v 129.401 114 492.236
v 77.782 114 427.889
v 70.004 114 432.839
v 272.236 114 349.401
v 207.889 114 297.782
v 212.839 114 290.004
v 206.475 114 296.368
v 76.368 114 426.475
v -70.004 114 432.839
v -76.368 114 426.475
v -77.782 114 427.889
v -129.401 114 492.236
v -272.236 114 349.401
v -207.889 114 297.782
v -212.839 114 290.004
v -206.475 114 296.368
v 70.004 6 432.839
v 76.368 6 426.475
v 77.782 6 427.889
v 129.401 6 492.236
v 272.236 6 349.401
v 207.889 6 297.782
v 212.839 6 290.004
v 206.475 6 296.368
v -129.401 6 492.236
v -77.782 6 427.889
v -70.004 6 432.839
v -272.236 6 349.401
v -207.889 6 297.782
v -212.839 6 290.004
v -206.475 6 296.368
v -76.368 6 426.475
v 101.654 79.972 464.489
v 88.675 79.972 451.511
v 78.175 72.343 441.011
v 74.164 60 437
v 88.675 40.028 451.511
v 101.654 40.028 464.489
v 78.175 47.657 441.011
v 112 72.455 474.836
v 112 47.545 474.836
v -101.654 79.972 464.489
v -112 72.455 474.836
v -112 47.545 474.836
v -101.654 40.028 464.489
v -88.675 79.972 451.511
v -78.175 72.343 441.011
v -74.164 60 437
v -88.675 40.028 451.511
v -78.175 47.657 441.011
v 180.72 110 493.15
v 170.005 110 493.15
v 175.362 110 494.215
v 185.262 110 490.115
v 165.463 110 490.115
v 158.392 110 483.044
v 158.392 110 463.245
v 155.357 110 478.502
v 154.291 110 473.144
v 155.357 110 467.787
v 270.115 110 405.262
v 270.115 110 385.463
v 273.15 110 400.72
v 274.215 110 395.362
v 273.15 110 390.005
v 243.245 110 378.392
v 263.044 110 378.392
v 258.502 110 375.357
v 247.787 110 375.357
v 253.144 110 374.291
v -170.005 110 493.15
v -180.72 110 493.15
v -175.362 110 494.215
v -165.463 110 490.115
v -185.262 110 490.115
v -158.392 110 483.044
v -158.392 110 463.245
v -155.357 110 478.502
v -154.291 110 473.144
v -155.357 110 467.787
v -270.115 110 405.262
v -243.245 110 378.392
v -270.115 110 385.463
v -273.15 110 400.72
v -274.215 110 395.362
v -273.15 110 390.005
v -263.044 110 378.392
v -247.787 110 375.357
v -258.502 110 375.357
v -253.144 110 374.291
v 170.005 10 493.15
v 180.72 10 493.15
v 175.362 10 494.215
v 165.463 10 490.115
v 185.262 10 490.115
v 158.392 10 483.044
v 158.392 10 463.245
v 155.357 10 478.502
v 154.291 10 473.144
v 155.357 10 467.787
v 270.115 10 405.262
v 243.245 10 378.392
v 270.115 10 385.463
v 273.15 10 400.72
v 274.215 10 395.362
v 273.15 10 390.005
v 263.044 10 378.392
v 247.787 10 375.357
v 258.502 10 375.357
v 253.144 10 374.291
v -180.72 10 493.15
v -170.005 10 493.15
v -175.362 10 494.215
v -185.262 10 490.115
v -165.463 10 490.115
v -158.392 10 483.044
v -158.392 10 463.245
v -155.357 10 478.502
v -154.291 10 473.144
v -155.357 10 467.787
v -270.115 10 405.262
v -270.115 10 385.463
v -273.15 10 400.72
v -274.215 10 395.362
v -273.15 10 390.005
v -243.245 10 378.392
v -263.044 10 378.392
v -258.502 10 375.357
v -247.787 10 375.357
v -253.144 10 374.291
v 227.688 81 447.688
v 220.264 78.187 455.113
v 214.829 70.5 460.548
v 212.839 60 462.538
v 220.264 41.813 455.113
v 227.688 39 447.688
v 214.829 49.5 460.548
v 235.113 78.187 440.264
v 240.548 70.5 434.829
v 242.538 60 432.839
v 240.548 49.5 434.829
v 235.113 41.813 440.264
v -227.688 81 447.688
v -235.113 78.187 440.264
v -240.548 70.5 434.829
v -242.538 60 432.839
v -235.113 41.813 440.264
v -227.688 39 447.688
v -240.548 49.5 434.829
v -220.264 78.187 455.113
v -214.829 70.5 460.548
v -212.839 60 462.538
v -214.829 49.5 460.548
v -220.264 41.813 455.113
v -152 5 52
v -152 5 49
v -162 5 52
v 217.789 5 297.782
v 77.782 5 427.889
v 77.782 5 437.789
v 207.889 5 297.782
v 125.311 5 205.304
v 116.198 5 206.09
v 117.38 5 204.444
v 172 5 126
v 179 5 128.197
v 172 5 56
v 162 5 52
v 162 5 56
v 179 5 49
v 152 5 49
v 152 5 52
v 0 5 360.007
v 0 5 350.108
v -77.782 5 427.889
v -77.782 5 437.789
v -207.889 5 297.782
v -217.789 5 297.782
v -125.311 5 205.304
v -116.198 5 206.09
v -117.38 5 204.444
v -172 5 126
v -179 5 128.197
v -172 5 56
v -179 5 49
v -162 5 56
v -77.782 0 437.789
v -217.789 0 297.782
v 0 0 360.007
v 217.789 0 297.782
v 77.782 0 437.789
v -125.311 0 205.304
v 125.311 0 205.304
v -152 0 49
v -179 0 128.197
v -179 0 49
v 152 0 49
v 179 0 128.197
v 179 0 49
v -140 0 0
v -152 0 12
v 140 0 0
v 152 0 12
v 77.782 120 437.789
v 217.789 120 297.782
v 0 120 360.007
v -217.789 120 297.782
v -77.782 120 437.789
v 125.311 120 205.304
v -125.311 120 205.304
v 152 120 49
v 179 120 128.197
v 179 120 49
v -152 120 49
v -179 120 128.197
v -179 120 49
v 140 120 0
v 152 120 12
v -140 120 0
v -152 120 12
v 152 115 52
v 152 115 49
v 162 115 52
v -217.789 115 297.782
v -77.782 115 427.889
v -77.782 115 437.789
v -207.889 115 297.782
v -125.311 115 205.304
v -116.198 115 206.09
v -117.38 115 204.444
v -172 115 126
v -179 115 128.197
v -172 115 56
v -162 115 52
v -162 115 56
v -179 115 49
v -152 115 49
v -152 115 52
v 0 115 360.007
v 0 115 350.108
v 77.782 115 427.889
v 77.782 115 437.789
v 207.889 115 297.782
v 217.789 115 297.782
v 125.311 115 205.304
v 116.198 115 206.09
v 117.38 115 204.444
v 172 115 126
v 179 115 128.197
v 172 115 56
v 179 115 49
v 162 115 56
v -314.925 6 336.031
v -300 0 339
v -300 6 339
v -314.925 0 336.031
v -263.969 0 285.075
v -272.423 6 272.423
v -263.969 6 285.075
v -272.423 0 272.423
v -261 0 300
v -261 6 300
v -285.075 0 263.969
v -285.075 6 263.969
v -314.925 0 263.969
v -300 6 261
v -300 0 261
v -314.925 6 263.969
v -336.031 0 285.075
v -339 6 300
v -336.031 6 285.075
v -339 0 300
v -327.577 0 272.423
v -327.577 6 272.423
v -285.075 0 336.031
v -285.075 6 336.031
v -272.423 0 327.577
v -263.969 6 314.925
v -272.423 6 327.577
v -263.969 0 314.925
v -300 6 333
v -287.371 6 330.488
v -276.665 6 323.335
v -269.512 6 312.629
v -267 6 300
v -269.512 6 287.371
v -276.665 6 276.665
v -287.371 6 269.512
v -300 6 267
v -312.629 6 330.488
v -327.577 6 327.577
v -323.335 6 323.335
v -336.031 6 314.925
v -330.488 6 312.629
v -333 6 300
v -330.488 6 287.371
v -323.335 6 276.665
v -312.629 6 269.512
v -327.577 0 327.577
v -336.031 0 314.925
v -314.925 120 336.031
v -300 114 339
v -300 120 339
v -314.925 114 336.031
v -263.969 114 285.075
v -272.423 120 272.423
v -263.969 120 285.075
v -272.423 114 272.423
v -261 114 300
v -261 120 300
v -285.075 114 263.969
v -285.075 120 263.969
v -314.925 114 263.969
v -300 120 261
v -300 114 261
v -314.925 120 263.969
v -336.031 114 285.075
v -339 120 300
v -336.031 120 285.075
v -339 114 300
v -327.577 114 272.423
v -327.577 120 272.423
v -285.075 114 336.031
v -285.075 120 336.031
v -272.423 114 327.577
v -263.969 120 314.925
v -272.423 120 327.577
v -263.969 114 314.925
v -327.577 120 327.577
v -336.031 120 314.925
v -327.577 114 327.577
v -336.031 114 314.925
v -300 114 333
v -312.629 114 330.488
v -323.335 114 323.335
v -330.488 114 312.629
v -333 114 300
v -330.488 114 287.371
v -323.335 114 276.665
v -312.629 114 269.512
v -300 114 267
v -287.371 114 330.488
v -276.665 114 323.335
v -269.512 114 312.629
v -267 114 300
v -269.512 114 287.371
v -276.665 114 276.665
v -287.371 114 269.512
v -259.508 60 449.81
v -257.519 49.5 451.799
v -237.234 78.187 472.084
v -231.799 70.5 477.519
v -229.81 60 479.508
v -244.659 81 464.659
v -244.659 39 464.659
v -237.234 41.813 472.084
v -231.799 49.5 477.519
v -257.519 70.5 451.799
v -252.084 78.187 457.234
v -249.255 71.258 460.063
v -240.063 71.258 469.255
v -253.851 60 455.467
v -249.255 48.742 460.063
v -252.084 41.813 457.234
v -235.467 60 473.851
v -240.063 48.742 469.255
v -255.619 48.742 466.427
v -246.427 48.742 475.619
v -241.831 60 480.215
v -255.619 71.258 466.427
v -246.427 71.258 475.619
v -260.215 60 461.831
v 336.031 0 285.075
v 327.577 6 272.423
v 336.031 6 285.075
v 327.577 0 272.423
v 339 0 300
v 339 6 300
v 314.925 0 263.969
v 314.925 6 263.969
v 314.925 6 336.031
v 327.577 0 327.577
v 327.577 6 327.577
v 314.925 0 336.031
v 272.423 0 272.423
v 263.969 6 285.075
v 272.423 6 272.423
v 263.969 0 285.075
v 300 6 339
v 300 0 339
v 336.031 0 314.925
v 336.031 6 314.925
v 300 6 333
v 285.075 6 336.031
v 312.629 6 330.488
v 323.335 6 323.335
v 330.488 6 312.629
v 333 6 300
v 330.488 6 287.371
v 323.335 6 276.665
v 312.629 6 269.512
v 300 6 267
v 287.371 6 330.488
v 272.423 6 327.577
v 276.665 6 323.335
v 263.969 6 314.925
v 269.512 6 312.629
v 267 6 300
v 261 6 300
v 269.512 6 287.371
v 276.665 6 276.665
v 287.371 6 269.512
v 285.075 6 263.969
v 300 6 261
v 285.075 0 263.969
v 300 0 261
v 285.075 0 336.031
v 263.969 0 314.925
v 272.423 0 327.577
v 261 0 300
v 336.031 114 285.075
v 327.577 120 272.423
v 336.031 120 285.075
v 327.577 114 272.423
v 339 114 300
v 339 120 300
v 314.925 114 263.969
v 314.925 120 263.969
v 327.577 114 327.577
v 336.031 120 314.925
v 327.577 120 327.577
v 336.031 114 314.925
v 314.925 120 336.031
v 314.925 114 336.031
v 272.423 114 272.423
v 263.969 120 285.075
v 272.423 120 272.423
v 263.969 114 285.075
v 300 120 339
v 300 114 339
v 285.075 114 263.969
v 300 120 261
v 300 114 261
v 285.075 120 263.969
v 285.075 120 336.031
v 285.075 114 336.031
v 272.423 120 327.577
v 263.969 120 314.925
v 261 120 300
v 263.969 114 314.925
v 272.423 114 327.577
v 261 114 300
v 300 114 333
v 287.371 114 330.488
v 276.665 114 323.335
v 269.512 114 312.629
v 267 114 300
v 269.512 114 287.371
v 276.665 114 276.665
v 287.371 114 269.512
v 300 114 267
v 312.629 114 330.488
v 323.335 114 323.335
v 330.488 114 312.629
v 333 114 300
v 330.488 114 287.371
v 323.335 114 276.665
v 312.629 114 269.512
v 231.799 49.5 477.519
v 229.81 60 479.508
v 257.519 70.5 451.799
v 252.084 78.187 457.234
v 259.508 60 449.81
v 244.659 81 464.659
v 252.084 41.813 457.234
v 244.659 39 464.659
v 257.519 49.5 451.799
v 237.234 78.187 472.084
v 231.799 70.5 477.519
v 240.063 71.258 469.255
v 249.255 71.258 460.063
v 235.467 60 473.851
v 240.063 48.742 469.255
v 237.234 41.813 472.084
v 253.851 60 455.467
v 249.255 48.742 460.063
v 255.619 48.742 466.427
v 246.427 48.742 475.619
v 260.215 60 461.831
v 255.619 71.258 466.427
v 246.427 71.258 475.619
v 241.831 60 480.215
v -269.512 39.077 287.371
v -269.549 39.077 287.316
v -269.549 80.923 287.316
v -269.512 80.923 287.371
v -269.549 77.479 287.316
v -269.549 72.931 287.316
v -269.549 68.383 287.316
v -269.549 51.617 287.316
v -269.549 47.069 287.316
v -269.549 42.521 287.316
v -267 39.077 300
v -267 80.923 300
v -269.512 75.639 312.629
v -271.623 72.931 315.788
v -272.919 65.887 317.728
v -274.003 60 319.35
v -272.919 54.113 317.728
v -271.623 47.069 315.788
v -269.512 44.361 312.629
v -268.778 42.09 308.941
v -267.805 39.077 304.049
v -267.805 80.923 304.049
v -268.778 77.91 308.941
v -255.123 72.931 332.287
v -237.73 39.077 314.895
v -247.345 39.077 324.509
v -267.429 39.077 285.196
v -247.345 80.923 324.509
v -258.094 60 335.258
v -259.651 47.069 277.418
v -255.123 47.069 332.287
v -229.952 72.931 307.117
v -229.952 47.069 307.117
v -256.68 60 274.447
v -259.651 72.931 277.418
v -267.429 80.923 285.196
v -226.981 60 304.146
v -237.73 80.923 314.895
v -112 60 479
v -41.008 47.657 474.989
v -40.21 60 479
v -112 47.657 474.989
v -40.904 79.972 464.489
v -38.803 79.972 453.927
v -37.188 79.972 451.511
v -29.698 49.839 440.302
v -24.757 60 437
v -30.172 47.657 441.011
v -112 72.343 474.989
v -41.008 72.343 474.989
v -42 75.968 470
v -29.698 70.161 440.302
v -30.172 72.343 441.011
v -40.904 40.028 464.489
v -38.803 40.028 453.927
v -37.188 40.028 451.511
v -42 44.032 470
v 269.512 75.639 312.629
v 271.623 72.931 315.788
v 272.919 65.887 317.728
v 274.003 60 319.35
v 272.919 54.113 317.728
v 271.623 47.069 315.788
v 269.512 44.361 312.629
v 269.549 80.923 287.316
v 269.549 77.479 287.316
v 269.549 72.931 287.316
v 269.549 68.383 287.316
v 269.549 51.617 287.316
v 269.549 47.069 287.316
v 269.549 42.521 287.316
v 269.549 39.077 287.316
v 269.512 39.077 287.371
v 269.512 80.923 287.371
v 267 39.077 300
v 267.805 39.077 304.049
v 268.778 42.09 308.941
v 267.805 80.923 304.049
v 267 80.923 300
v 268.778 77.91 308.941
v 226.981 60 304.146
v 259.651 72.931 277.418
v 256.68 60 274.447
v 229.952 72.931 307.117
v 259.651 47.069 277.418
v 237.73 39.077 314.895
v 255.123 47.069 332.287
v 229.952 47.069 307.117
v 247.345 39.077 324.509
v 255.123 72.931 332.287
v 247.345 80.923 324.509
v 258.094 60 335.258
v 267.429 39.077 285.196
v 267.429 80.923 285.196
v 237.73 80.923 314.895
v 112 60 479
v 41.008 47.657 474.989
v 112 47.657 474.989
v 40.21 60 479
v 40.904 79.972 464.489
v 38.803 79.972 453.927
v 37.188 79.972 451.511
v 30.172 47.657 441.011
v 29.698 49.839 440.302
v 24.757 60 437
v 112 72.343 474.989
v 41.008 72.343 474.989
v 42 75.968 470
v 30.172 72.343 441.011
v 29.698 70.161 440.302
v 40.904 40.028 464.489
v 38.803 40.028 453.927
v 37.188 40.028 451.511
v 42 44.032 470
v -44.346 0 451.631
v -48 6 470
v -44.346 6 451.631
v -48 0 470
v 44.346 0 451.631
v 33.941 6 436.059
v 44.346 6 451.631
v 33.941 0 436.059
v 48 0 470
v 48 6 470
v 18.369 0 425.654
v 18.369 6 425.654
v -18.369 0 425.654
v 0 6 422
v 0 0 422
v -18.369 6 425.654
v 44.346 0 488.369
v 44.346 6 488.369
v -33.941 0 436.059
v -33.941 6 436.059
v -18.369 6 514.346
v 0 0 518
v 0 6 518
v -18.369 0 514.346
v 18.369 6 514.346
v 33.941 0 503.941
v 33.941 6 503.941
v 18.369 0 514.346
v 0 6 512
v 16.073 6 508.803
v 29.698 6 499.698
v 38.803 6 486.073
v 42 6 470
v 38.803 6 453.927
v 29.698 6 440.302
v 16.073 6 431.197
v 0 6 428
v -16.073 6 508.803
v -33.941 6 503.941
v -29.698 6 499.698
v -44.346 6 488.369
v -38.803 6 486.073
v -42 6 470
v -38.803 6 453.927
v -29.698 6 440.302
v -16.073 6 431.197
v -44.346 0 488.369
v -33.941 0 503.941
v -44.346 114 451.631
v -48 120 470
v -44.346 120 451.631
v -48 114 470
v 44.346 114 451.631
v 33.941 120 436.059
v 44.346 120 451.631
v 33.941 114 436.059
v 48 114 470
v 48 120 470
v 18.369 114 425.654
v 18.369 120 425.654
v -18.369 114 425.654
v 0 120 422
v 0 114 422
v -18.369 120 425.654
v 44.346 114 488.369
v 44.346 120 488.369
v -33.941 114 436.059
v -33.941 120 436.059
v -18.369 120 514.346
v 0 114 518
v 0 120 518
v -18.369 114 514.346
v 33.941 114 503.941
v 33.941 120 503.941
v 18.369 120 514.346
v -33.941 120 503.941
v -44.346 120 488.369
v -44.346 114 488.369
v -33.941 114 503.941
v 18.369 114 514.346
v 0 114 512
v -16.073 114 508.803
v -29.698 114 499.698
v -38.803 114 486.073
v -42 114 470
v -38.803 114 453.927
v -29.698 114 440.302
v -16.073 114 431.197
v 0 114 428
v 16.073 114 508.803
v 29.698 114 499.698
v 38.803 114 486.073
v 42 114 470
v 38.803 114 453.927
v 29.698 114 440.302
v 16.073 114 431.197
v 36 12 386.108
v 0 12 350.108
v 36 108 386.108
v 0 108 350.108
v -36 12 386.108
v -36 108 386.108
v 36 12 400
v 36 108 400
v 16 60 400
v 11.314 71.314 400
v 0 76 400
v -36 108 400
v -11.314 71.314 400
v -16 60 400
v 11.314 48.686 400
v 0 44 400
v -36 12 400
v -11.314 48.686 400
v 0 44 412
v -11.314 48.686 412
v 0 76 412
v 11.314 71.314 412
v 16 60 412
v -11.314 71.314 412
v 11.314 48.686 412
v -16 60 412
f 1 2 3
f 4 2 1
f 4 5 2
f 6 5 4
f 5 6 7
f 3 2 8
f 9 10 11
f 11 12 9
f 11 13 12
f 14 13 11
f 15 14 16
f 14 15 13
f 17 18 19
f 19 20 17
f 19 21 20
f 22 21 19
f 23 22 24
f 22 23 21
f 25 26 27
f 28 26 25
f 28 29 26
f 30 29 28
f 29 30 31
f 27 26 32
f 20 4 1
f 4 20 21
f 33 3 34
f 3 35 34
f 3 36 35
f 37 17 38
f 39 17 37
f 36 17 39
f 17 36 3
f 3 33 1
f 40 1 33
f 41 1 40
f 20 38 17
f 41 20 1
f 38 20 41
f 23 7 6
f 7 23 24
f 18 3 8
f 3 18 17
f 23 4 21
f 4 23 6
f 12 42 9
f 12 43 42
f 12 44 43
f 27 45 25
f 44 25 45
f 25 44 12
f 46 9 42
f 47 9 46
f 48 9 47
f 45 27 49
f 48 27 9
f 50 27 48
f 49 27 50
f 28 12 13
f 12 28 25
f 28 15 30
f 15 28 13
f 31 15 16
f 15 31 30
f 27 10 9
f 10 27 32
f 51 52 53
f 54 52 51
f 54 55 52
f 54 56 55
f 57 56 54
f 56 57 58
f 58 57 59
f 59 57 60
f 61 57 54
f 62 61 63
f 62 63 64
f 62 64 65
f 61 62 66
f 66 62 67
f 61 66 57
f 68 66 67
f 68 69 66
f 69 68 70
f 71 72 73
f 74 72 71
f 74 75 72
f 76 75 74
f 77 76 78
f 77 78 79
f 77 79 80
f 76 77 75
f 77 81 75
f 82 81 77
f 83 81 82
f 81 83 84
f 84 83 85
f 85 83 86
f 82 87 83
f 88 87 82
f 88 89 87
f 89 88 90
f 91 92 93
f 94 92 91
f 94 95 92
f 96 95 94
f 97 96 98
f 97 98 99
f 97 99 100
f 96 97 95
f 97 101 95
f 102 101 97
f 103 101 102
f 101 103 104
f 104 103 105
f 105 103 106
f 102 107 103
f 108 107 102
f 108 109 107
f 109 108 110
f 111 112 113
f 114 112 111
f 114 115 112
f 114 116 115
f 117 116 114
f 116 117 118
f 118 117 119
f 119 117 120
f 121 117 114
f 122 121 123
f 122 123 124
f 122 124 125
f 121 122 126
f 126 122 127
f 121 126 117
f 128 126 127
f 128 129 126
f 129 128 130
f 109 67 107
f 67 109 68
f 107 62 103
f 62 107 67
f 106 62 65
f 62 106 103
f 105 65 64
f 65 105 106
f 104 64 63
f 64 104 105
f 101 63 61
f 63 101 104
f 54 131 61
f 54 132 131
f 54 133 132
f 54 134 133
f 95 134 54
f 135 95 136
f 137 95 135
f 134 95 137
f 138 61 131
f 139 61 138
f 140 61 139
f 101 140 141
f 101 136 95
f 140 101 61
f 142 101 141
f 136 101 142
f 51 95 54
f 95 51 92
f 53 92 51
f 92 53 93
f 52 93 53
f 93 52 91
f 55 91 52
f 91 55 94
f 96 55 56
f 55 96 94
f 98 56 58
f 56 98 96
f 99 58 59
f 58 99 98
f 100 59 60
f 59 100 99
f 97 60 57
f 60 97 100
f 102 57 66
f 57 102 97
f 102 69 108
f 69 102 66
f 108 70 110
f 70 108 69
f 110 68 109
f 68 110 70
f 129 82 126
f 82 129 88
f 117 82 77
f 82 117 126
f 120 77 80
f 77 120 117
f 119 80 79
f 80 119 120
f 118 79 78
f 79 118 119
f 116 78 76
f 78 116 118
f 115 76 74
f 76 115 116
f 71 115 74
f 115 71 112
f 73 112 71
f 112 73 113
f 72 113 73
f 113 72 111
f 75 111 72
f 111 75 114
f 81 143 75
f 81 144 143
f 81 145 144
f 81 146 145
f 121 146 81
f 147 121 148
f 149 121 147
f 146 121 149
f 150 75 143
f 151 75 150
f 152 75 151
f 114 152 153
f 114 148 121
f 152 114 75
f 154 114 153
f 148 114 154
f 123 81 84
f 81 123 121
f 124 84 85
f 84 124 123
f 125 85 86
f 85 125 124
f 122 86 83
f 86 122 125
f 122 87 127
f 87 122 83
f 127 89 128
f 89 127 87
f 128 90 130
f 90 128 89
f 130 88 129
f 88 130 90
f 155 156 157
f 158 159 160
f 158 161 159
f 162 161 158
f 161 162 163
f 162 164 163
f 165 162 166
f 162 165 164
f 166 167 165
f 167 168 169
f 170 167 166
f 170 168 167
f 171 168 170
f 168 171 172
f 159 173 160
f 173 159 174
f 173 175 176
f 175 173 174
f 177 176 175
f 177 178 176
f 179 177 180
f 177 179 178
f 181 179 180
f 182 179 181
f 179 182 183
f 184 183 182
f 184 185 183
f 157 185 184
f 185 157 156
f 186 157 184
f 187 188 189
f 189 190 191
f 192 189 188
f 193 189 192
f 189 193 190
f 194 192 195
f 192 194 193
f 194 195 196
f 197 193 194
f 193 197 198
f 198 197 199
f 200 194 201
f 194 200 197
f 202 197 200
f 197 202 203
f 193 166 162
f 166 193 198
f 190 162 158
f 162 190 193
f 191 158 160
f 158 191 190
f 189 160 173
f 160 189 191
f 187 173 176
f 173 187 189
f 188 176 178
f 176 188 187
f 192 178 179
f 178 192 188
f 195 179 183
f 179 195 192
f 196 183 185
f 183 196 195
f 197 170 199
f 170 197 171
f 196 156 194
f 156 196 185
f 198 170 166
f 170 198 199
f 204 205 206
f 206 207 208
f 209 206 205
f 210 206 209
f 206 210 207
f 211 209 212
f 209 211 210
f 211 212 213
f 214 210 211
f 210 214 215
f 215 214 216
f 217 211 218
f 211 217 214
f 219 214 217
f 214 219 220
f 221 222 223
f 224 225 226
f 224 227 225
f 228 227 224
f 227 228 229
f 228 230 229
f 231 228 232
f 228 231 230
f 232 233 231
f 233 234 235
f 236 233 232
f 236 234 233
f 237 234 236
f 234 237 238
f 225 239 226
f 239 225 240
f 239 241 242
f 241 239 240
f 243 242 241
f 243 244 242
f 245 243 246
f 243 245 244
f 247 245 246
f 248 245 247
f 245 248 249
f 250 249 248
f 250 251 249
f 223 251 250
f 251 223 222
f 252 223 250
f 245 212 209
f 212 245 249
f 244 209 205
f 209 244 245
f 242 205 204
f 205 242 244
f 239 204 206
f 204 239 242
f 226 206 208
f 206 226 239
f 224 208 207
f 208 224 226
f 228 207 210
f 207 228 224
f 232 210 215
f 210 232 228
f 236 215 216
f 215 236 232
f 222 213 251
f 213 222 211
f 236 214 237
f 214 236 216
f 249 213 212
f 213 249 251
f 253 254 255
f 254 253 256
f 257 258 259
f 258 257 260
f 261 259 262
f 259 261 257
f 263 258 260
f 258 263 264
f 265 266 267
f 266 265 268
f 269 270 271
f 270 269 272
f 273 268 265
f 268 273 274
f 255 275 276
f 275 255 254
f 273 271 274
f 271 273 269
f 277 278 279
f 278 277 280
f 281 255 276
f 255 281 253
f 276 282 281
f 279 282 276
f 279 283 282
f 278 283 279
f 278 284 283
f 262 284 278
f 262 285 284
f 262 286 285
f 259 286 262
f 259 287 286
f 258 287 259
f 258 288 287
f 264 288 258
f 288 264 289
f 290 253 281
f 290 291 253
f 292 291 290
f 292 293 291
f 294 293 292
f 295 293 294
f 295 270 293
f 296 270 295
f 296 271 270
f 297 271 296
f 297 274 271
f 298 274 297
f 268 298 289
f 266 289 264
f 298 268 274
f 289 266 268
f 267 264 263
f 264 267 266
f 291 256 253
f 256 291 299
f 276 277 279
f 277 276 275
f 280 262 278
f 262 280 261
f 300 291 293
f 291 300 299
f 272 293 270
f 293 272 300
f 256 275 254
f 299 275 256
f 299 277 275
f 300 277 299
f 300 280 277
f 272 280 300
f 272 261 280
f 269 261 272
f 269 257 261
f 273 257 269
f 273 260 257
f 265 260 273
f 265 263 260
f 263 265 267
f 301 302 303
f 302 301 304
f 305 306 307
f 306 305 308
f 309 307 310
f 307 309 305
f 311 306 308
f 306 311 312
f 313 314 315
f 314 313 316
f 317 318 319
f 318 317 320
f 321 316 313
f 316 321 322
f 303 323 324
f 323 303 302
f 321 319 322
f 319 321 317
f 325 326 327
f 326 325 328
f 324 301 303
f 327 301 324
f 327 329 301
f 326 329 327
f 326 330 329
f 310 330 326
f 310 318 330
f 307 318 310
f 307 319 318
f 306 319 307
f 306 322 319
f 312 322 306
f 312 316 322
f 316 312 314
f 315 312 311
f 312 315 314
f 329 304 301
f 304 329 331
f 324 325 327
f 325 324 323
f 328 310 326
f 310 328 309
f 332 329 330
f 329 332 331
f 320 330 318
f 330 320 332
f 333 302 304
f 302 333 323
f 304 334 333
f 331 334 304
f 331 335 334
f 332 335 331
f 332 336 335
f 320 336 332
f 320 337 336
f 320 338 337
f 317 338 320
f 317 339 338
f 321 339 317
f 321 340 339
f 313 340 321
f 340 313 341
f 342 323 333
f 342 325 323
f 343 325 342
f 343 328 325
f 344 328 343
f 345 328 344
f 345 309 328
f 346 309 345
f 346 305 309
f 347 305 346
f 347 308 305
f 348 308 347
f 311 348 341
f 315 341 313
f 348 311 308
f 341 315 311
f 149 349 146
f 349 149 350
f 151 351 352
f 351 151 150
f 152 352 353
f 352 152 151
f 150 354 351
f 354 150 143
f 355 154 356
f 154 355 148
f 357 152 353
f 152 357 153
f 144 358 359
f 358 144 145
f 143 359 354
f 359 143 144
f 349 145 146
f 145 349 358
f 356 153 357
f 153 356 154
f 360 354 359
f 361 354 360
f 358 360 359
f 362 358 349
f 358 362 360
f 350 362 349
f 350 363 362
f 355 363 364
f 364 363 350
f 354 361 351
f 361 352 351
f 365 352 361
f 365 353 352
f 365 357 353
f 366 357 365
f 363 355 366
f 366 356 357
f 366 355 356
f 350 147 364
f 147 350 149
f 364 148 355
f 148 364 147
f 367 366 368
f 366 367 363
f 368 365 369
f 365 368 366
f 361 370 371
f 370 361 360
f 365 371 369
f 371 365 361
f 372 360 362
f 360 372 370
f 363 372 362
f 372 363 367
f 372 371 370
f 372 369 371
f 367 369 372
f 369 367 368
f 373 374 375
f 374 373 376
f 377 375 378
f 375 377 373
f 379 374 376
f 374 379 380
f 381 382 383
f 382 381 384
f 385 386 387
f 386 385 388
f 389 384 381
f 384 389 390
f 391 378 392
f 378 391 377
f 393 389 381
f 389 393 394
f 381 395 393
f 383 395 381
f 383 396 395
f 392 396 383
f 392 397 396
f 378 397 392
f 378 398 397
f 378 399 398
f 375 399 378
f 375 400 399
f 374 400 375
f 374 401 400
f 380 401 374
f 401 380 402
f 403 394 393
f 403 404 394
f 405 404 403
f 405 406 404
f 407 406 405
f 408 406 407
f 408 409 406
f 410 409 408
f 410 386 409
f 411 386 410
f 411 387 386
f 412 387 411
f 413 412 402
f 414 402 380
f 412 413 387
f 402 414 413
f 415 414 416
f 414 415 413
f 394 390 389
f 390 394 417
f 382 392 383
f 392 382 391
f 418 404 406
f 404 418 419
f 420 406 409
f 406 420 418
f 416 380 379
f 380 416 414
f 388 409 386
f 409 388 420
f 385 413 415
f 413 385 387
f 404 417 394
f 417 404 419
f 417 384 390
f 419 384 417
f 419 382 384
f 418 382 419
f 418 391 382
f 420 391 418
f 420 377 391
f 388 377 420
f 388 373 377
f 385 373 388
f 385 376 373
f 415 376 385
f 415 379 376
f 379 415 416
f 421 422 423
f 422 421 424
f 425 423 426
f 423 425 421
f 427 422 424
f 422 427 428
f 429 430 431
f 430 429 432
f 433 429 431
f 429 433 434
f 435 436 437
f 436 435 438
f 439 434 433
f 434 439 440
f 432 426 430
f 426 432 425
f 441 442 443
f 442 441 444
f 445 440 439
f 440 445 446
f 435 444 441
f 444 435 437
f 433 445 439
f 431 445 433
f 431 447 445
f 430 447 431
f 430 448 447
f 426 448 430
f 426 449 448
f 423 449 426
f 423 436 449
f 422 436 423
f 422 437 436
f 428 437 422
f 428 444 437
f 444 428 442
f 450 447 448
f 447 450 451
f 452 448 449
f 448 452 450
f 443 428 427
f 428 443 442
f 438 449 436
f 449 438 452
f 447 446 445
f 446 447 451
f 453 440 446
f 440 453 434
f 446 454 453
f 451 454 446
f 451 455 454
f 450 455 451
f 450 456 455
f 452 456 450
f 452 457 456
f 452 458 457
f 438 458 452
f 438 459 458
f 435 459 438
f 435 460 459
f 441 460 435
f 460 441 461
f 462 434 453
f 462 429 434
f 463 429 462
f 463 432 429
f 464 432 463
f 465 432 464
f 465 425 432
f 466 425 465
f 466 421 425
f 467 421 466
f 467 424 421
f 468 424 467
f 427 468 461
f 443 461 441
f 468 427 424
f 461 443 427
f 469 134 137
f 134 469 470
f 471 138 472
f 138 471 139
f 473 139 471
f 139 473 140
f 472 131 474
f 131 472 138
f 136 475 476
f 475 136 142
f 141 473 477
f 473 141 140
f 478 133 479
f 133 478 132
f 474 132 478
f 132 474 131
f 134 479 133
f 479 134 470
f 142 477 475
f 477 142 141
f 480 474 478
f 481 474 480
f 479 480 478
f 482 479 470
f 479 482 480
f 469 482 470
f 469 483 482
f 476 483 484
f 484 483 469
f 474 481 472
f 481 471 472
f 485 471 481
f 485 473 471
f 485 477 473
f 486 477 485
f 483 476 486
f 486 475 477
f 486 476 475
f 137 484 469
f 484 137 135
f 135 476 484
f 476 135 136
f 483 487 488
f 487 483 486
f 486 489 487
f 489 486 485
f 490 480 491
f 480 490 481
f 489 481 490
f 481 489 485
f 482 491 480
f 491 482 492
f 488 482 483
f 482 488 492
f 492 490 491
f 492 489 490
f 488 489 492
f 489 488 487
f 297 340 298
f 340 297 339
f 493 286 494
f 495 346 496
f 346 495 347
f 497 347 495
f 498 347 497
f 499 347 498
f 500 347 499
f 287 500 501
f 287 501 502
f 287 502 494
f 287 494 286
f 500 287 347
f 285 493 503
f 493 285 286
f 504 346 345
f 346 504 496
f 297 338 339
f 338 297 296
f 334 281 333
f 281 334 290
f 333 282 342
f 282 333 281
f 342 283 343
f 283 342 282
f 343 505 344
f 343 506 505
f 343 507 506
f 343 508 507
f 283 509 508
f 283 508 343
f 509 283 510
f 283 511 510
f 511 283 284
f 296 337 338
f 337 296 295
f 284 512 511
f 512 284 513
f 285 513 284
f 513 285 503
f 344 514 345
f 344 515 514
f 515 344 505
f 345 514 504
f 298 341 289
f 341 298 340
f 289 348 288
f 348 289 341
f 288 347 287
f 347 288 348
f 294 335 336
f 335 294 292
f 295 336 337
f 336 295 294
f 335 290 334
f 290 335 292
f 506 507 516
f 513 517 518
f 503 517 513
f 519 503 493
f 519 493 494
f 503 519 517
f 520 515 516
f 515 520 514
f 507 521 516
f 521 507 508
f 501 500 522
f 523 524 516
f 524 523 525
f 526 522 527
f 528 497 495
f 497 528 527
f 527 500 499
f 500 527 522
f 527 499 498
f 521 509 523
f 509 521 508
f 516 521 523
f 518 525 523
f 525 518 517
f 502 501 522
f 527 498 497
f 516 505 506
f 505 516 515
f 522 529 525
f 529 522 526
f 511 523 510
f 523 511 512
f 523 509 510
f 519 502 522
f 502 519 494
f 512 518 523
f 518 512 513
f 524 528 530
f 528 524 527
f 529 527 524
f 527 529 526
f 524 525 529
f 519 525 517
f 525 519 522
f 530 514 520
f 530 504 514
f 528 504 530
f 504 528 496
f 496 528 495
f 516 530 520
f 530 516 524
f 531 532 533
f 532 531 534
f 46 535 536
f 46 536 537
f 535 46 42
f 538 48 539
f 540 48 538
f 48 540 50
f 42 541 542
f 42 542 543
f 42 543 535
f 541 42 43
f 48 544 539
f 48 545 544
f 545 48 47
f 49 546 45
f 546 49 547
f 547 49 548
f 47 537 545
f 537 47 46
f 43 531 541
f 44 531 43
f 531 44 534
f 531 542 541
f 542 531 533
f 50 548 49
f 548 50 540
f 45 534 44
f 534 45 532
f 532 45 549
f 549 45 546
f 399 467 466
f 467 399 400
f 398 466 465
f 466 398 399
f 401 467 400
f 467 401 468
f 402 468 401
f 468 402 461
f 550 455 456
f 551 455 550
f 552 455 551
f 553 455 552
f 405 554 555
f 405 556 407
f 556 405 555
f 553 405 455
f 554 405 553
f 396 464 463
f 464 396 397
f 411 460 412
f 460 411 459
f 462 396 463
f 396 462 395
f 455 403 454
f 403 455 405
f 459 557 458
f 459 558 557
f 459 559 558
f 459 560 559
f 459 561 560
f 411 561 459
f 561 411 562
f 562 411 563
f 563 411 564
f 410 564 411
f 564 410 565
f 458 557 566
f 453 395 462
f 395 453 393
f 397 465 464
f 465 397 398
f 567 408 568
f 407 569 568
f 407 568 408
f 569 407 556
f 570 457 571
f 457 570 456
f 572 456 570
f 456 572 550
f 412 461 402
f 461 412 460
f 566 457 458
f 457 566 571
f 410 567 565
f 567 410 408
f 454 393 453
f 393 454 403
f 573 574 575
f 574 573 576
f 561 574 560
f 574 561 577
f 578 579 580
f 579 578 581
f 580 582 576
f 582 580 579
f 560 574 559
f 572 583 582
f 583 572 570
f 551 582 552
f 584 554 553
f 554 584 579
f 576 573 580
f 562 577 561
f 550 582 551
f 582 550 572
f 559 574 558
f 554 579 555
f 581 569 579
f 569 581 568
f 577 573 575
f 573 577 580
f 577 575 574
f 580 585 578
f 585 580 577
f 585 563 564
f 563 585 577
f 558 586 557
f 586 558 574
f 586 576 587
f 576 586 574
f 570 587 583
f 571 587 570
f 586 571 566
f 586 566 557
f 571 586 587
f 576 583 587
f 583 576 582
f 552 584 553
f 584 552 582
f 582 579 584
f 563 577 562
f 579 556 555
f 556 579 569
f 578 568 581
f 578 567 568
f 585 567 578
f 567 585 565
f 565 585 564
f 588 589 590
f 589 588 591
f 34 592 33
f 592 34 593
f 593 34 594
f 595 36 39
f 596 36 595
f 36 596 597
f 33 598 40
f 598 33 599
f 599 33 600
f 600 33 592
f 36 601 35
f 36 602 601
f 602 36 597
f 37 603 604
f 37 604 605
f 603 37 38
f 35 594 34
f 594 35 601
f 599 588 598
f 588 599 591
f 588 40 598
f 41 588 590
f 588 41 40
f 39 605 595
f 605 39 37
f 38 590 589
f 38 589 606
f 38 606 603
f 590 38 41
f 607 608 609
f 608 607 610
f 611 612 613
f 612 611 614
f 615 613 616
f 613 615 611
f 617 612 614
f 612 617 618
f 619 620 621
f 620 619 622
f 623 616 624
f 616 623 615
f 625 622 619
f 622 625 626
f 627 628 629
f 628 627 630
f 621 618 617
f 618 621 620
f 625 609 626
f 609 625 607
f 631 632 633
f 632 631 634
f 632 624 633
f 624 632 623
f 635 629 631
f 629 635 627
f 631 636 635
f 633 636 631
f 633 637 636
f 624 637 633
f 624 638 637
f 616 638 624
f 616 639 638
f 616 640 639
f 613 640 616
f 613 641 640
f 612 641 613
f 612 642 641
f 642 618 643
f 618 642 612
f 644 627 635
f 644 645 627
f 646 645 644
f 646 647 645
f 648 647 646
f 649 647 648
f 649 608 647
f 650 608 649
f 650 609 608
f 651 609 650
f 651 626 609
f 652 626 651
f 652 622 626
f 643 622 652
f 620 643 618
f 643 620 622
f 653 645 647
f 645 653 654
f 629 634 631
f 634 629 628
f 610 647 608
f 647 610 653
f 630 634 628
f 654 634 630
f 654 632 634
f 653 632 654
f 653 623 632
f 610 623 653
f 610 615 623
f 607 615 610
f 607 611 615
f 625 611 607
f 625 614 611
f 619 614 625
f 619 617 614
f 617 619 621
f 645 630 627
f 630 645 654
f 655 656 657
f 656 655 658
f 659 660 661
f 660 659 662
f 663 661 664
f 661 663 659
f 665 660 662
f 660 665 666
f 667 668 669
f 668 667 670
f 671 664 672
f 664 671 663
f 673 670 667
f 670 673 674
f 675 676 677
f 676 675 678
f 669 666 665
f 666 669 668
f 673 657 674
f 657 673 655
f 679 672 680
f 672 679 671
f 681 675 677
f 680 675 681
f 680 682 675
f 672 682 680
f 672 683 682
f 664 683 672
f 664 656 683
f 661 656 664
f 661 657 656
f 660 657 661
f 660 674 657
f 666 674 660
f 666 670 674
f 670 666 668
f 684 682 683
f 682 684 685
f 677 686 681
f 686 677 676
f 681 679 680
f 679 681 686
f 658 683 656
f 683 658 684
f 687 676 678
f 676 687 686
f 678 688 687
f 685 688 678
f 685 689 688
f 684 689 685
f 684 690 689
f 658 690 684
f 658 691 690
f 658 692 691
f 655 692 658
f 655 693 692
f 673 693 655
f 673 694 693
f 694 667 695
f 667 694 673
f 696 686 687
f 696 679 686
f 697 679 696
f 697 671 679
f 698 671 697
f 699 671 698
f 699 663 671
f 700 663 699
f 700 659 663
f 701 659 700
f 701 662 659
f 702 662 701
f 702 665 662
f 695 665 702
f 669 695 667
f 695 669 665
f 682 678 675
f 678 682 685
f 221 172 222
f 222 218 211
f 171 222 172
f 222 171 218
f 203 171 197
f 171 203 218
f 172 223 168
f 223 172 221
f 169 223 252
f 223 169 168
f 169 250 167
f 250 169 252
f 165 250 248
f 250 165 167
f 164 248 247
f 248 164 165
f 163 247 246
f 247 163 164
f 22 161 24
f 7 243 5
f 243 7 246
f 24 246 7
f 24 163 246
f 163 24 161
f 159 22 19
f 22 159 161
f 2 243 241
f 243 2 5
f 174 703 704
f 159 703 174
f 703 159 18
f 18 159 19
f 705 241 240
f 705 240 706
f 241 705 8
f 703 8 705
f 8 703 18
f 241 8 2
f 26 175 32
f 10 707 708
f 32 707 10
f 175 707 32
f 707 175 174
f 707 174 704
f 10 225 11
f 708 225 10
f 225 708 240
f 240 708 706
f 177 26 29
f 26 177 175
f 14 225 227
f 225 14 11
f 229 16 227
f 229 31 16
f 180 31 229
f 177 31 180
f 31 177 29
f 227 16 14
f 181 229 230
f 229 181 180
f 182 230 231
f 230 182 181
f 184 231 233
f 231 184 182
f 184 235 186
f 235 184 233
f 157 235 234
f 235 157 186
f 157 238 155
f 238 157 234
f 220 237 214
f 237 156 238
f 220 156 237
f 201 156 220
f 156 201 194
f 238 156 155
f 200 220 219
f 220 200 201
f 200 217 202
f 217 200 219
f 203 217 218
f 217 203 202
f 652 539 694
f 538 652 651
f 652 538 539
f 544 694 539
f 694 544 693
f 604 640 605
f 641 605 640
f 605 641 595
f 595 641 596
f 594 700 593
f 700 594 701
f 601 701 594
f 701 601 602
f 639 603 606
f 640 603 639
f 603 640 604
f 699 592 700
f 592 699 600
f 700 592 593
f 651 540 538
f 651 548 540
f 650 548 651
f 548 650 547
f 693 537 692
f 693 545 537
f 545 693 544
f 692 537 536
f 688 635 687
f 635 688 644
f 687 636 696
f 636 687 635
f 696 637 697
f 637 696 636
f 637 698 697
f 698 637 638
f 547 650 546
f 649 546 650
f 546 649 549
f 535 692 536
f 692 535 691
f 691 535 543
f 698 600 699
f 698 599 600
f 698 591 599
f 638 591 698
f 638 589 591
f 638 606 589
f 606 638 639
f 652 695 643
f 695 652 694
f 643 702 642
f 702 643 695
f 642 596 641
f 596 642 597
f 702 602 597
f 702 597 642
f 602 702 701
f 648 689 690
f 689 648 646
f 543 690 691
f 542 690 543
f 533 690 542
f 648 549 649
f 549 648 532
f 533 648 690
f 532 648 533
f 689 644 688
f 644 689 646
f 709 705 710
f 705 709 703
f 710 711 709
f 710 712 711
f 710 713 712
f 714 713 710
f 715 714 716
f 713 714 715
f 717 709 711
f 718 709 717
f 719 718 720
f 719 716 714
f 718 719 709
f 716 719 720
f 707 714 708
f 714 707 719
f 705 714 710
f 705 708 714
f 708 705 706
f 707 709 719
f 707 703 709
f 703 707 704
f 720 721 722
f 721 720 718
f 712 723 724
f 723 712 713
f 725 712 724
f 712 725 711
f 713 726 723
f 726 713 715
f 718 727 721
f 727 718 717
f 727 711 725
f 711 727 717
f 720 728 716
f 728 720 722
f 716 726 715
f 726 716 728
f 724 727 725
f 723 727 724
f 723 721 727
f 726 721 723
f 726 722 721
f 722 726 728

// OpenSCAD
// One exported game mesh per run: openscad.com -o parts/<part>-lod<lod>.stl -D part="pair" -D lod=0 mtu-part.scad
include <mtu-lib.scad>
part = "pair";

if (part == "start") start_segment();
if (part == "pair") pair_segment();
if (part == "output") output_segment();
if (part == "turbo") turbo_set(0);
if (part == "turbo-outboard") turbo_set(1);
if (part == "tra-input") tra_input();
if (part == "tra-shroud") tra_shroud();
if (part == "tra-output-l") tra_output_left();
if (part == "tra-output-r") tra_output_right();
if (part == "lon-input") lon_input();
if (part == "lon-shroud") lon_shroud();
if (part == "lon-output") lon_output();
if (part == "twin-bridge") twin_bridge();
